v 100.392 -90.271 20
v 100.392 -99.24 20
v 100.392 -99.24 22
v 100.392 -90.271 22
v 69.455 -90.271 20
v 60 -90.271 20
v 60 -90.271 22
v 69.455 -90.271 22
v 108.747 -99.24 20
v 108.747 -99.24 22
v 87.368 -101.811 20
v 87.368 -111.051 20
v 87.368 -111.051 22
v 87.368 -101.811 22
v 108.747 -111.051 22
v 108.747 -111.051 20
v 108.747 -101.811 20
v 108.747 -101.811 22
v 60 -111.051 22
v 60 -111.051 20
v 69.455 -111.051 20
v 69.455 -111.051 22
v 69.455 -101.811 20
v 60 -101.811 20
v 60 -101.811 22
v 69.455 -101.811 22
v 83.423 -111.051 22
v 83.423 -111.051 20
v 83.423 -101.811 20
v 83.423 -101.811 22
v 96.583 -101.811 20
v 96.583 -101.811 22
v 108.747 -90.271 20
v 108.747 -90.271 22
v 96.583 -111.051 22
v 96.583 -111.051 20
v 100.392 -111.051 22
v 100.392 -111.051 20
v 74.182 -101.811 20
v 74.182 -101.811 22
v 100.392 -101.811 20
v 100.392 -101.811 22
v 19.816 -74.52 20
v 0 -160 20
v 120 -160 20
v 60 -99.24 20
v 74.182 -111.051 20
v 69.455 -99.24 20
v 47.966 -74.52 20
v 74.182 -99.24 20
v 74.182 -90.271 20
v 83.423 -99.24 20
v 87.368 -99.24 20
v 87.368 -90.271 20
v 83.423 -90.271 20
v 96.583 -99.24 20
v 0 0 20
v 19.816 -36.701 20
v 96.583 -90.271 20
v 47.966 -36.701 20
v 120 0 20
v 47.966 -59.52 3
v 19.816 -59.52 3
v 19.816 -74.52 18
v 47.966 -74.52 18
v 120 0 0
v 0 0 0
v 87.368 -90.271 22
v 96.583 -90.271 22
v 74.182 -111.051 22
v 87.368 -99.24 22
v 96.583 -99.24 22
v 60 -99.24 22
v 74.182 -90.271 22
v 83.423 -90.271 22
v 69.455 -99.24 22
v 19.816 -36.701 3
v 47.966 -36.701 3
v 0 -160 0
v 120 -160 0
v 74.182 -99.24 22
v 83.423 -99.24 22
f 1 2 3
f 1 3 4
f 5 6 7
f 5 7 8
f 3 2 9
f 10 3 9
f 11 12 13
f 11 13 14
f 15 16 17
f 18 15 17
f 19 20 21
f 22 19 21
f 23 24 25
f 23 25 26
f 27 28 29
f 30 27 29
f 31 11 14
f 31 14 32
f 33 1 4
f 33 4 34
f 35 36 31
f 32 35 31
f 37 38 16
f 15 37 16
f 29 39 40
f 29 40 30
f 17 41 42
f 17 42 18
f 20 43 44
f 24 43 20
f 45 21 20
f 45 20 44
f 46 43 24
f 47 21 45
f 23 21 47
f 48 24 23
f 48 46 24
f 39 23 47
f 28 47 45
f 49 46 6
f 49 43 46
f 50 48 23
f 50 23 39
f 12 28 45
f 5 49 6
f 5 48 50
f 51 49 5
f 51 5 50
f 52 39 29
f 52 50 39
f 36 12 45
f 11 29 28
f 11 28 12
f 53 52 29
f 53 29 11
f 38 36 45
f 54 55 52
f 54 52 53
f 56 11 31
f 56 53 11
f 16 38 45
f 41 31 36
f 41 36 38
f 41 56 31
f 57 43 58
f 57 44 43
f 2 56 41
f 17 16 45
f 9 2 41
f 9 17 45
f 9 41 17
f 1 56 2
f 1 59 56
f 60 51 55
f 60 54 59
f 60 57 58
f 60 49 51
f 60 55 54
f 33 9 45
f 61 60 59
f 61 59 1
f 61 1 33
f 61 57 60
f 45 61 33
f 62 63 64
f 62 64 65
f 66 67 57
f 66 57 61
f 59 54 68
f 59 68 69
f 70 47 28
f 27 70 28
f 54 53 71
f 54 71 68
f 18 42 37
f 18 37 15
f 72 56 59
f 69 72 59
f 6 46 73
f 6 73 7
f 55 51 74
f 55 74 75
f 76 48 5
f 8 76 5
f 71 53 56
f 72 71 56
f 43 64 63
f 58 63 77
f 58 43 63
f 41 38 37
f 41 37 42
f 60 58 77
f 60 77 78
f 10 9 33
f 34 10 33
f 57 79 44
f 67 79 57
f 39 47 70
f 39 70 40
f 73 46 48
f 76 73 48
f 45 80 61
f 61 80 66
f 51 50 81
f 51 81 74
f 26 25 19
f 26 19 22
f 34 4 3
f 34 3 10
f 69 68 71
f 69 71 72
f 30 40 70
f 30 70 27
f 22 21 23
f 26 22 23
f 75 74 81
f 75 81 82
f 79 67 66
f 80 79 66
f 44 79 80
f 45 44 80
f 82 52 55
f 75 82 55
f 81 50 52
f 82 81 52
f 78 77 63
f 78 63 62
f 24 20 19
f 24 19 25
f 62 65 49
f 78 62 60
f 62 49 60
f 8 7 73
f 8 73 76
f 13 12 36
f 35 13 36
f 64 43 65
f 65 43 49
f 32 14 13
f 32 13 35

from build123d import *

# Parameters (mm, degrees)
CROQUIS1_W              = 120
CROQUIS1_H              = 160
SALIENTE_EXTRUIR1_DEPTH = 20
CROQUIS2_W              = 28.149997618
CROQUIS2_H              = 37.819844128
CORTAR_EXTRUIR1_DEPTH   = 17
CHAFL_N1_SIZE           = 15
CROQUIS3_W              = 9.454961032
CROQUIS3_H              = 9.240075554
CROQUIS3_W_2            = 9.240075554
CROQUIS3_W_3            = 9.215154211
CROQUIS3_W_4            = 8.355073151
CROQUIS3_H_2            = 8.969416765
SALIENTE_EXTRUIR2_DEPTH = 2


with BuildPart() as part:
    # Croquis1 → Saliente-Extruir1 (new body)
    with BuildSketch(Plane.XY):
        with Locations((60, -80)):
            Rectangle(CROQUIS1_W, CROQUIS1_H)
    extrude(amount=SALIENTE_EXTRUIR1_DEPTH)

    # Croquis2 → Cortar-Extruir1 (cut)
    with BuildSketch(Plane.XY.offset(20)):
        with Locations((33.891414423, -55.610498247)):
            Rectangle(CROQUIS2_W, CROQUIS2_H)
    extrude(amount=-CORTAR_EXTRUIR1_DEPTH, mode=Mode.SUBTRACT)

    # Chaflán1
    chafl_n1_edges = [part.edges().sort_by_distance(p)[0] for p in [
        (33.891414423, -74.520420311, 3),
    ]]
    chamfer(chafl_n1_edges, length=CHAFL_N1_SIZE)

    # Croquis3 → Saliente-Extruir2 (add)
    with BuildSketch(Plane.XY.offset(20)):
        with Locations((64.727480516, -106.430913794)):
            Rectangle(CROQUIS3_W, CROQUIS3_H)
        with Locations((78.802479325, -106.430913794)):
            Rectangle(CROQUIS3_W_2, CROQUIS3_H)
        with Locations((91.975896748, -106.430913794)):
            Rectangle(CROQUIS3_W_3, CROQUIS3_H)
        with Locations((104.569940836, -106.430913794)):
            Rectangle(CROQUIS3_W_4, CROQUIS3_H)
        with Locations((64.727480516, -94.755549816)):
            Rectangle(CROQUIS3_W, CROQUIS3_H_2)
        with Locations((78.802479325, -94.755549816)):
            Rectangle(CROQUIS3_W_2, CROQUIS3_H_2)
        with Locations((91.975896748, -94.755549816)):
            Rectangle(CROQUIS3_W_3, CROQUIS3_H_2)
        with Locations((104.569940836, -94.755549816)):
            Rectangle(CROQUIS3_W_4, CROQUIS3_H_2)
    extrude(amount=SALIENTE_EXTRUIR2_DEPTH)


solid = part.part
